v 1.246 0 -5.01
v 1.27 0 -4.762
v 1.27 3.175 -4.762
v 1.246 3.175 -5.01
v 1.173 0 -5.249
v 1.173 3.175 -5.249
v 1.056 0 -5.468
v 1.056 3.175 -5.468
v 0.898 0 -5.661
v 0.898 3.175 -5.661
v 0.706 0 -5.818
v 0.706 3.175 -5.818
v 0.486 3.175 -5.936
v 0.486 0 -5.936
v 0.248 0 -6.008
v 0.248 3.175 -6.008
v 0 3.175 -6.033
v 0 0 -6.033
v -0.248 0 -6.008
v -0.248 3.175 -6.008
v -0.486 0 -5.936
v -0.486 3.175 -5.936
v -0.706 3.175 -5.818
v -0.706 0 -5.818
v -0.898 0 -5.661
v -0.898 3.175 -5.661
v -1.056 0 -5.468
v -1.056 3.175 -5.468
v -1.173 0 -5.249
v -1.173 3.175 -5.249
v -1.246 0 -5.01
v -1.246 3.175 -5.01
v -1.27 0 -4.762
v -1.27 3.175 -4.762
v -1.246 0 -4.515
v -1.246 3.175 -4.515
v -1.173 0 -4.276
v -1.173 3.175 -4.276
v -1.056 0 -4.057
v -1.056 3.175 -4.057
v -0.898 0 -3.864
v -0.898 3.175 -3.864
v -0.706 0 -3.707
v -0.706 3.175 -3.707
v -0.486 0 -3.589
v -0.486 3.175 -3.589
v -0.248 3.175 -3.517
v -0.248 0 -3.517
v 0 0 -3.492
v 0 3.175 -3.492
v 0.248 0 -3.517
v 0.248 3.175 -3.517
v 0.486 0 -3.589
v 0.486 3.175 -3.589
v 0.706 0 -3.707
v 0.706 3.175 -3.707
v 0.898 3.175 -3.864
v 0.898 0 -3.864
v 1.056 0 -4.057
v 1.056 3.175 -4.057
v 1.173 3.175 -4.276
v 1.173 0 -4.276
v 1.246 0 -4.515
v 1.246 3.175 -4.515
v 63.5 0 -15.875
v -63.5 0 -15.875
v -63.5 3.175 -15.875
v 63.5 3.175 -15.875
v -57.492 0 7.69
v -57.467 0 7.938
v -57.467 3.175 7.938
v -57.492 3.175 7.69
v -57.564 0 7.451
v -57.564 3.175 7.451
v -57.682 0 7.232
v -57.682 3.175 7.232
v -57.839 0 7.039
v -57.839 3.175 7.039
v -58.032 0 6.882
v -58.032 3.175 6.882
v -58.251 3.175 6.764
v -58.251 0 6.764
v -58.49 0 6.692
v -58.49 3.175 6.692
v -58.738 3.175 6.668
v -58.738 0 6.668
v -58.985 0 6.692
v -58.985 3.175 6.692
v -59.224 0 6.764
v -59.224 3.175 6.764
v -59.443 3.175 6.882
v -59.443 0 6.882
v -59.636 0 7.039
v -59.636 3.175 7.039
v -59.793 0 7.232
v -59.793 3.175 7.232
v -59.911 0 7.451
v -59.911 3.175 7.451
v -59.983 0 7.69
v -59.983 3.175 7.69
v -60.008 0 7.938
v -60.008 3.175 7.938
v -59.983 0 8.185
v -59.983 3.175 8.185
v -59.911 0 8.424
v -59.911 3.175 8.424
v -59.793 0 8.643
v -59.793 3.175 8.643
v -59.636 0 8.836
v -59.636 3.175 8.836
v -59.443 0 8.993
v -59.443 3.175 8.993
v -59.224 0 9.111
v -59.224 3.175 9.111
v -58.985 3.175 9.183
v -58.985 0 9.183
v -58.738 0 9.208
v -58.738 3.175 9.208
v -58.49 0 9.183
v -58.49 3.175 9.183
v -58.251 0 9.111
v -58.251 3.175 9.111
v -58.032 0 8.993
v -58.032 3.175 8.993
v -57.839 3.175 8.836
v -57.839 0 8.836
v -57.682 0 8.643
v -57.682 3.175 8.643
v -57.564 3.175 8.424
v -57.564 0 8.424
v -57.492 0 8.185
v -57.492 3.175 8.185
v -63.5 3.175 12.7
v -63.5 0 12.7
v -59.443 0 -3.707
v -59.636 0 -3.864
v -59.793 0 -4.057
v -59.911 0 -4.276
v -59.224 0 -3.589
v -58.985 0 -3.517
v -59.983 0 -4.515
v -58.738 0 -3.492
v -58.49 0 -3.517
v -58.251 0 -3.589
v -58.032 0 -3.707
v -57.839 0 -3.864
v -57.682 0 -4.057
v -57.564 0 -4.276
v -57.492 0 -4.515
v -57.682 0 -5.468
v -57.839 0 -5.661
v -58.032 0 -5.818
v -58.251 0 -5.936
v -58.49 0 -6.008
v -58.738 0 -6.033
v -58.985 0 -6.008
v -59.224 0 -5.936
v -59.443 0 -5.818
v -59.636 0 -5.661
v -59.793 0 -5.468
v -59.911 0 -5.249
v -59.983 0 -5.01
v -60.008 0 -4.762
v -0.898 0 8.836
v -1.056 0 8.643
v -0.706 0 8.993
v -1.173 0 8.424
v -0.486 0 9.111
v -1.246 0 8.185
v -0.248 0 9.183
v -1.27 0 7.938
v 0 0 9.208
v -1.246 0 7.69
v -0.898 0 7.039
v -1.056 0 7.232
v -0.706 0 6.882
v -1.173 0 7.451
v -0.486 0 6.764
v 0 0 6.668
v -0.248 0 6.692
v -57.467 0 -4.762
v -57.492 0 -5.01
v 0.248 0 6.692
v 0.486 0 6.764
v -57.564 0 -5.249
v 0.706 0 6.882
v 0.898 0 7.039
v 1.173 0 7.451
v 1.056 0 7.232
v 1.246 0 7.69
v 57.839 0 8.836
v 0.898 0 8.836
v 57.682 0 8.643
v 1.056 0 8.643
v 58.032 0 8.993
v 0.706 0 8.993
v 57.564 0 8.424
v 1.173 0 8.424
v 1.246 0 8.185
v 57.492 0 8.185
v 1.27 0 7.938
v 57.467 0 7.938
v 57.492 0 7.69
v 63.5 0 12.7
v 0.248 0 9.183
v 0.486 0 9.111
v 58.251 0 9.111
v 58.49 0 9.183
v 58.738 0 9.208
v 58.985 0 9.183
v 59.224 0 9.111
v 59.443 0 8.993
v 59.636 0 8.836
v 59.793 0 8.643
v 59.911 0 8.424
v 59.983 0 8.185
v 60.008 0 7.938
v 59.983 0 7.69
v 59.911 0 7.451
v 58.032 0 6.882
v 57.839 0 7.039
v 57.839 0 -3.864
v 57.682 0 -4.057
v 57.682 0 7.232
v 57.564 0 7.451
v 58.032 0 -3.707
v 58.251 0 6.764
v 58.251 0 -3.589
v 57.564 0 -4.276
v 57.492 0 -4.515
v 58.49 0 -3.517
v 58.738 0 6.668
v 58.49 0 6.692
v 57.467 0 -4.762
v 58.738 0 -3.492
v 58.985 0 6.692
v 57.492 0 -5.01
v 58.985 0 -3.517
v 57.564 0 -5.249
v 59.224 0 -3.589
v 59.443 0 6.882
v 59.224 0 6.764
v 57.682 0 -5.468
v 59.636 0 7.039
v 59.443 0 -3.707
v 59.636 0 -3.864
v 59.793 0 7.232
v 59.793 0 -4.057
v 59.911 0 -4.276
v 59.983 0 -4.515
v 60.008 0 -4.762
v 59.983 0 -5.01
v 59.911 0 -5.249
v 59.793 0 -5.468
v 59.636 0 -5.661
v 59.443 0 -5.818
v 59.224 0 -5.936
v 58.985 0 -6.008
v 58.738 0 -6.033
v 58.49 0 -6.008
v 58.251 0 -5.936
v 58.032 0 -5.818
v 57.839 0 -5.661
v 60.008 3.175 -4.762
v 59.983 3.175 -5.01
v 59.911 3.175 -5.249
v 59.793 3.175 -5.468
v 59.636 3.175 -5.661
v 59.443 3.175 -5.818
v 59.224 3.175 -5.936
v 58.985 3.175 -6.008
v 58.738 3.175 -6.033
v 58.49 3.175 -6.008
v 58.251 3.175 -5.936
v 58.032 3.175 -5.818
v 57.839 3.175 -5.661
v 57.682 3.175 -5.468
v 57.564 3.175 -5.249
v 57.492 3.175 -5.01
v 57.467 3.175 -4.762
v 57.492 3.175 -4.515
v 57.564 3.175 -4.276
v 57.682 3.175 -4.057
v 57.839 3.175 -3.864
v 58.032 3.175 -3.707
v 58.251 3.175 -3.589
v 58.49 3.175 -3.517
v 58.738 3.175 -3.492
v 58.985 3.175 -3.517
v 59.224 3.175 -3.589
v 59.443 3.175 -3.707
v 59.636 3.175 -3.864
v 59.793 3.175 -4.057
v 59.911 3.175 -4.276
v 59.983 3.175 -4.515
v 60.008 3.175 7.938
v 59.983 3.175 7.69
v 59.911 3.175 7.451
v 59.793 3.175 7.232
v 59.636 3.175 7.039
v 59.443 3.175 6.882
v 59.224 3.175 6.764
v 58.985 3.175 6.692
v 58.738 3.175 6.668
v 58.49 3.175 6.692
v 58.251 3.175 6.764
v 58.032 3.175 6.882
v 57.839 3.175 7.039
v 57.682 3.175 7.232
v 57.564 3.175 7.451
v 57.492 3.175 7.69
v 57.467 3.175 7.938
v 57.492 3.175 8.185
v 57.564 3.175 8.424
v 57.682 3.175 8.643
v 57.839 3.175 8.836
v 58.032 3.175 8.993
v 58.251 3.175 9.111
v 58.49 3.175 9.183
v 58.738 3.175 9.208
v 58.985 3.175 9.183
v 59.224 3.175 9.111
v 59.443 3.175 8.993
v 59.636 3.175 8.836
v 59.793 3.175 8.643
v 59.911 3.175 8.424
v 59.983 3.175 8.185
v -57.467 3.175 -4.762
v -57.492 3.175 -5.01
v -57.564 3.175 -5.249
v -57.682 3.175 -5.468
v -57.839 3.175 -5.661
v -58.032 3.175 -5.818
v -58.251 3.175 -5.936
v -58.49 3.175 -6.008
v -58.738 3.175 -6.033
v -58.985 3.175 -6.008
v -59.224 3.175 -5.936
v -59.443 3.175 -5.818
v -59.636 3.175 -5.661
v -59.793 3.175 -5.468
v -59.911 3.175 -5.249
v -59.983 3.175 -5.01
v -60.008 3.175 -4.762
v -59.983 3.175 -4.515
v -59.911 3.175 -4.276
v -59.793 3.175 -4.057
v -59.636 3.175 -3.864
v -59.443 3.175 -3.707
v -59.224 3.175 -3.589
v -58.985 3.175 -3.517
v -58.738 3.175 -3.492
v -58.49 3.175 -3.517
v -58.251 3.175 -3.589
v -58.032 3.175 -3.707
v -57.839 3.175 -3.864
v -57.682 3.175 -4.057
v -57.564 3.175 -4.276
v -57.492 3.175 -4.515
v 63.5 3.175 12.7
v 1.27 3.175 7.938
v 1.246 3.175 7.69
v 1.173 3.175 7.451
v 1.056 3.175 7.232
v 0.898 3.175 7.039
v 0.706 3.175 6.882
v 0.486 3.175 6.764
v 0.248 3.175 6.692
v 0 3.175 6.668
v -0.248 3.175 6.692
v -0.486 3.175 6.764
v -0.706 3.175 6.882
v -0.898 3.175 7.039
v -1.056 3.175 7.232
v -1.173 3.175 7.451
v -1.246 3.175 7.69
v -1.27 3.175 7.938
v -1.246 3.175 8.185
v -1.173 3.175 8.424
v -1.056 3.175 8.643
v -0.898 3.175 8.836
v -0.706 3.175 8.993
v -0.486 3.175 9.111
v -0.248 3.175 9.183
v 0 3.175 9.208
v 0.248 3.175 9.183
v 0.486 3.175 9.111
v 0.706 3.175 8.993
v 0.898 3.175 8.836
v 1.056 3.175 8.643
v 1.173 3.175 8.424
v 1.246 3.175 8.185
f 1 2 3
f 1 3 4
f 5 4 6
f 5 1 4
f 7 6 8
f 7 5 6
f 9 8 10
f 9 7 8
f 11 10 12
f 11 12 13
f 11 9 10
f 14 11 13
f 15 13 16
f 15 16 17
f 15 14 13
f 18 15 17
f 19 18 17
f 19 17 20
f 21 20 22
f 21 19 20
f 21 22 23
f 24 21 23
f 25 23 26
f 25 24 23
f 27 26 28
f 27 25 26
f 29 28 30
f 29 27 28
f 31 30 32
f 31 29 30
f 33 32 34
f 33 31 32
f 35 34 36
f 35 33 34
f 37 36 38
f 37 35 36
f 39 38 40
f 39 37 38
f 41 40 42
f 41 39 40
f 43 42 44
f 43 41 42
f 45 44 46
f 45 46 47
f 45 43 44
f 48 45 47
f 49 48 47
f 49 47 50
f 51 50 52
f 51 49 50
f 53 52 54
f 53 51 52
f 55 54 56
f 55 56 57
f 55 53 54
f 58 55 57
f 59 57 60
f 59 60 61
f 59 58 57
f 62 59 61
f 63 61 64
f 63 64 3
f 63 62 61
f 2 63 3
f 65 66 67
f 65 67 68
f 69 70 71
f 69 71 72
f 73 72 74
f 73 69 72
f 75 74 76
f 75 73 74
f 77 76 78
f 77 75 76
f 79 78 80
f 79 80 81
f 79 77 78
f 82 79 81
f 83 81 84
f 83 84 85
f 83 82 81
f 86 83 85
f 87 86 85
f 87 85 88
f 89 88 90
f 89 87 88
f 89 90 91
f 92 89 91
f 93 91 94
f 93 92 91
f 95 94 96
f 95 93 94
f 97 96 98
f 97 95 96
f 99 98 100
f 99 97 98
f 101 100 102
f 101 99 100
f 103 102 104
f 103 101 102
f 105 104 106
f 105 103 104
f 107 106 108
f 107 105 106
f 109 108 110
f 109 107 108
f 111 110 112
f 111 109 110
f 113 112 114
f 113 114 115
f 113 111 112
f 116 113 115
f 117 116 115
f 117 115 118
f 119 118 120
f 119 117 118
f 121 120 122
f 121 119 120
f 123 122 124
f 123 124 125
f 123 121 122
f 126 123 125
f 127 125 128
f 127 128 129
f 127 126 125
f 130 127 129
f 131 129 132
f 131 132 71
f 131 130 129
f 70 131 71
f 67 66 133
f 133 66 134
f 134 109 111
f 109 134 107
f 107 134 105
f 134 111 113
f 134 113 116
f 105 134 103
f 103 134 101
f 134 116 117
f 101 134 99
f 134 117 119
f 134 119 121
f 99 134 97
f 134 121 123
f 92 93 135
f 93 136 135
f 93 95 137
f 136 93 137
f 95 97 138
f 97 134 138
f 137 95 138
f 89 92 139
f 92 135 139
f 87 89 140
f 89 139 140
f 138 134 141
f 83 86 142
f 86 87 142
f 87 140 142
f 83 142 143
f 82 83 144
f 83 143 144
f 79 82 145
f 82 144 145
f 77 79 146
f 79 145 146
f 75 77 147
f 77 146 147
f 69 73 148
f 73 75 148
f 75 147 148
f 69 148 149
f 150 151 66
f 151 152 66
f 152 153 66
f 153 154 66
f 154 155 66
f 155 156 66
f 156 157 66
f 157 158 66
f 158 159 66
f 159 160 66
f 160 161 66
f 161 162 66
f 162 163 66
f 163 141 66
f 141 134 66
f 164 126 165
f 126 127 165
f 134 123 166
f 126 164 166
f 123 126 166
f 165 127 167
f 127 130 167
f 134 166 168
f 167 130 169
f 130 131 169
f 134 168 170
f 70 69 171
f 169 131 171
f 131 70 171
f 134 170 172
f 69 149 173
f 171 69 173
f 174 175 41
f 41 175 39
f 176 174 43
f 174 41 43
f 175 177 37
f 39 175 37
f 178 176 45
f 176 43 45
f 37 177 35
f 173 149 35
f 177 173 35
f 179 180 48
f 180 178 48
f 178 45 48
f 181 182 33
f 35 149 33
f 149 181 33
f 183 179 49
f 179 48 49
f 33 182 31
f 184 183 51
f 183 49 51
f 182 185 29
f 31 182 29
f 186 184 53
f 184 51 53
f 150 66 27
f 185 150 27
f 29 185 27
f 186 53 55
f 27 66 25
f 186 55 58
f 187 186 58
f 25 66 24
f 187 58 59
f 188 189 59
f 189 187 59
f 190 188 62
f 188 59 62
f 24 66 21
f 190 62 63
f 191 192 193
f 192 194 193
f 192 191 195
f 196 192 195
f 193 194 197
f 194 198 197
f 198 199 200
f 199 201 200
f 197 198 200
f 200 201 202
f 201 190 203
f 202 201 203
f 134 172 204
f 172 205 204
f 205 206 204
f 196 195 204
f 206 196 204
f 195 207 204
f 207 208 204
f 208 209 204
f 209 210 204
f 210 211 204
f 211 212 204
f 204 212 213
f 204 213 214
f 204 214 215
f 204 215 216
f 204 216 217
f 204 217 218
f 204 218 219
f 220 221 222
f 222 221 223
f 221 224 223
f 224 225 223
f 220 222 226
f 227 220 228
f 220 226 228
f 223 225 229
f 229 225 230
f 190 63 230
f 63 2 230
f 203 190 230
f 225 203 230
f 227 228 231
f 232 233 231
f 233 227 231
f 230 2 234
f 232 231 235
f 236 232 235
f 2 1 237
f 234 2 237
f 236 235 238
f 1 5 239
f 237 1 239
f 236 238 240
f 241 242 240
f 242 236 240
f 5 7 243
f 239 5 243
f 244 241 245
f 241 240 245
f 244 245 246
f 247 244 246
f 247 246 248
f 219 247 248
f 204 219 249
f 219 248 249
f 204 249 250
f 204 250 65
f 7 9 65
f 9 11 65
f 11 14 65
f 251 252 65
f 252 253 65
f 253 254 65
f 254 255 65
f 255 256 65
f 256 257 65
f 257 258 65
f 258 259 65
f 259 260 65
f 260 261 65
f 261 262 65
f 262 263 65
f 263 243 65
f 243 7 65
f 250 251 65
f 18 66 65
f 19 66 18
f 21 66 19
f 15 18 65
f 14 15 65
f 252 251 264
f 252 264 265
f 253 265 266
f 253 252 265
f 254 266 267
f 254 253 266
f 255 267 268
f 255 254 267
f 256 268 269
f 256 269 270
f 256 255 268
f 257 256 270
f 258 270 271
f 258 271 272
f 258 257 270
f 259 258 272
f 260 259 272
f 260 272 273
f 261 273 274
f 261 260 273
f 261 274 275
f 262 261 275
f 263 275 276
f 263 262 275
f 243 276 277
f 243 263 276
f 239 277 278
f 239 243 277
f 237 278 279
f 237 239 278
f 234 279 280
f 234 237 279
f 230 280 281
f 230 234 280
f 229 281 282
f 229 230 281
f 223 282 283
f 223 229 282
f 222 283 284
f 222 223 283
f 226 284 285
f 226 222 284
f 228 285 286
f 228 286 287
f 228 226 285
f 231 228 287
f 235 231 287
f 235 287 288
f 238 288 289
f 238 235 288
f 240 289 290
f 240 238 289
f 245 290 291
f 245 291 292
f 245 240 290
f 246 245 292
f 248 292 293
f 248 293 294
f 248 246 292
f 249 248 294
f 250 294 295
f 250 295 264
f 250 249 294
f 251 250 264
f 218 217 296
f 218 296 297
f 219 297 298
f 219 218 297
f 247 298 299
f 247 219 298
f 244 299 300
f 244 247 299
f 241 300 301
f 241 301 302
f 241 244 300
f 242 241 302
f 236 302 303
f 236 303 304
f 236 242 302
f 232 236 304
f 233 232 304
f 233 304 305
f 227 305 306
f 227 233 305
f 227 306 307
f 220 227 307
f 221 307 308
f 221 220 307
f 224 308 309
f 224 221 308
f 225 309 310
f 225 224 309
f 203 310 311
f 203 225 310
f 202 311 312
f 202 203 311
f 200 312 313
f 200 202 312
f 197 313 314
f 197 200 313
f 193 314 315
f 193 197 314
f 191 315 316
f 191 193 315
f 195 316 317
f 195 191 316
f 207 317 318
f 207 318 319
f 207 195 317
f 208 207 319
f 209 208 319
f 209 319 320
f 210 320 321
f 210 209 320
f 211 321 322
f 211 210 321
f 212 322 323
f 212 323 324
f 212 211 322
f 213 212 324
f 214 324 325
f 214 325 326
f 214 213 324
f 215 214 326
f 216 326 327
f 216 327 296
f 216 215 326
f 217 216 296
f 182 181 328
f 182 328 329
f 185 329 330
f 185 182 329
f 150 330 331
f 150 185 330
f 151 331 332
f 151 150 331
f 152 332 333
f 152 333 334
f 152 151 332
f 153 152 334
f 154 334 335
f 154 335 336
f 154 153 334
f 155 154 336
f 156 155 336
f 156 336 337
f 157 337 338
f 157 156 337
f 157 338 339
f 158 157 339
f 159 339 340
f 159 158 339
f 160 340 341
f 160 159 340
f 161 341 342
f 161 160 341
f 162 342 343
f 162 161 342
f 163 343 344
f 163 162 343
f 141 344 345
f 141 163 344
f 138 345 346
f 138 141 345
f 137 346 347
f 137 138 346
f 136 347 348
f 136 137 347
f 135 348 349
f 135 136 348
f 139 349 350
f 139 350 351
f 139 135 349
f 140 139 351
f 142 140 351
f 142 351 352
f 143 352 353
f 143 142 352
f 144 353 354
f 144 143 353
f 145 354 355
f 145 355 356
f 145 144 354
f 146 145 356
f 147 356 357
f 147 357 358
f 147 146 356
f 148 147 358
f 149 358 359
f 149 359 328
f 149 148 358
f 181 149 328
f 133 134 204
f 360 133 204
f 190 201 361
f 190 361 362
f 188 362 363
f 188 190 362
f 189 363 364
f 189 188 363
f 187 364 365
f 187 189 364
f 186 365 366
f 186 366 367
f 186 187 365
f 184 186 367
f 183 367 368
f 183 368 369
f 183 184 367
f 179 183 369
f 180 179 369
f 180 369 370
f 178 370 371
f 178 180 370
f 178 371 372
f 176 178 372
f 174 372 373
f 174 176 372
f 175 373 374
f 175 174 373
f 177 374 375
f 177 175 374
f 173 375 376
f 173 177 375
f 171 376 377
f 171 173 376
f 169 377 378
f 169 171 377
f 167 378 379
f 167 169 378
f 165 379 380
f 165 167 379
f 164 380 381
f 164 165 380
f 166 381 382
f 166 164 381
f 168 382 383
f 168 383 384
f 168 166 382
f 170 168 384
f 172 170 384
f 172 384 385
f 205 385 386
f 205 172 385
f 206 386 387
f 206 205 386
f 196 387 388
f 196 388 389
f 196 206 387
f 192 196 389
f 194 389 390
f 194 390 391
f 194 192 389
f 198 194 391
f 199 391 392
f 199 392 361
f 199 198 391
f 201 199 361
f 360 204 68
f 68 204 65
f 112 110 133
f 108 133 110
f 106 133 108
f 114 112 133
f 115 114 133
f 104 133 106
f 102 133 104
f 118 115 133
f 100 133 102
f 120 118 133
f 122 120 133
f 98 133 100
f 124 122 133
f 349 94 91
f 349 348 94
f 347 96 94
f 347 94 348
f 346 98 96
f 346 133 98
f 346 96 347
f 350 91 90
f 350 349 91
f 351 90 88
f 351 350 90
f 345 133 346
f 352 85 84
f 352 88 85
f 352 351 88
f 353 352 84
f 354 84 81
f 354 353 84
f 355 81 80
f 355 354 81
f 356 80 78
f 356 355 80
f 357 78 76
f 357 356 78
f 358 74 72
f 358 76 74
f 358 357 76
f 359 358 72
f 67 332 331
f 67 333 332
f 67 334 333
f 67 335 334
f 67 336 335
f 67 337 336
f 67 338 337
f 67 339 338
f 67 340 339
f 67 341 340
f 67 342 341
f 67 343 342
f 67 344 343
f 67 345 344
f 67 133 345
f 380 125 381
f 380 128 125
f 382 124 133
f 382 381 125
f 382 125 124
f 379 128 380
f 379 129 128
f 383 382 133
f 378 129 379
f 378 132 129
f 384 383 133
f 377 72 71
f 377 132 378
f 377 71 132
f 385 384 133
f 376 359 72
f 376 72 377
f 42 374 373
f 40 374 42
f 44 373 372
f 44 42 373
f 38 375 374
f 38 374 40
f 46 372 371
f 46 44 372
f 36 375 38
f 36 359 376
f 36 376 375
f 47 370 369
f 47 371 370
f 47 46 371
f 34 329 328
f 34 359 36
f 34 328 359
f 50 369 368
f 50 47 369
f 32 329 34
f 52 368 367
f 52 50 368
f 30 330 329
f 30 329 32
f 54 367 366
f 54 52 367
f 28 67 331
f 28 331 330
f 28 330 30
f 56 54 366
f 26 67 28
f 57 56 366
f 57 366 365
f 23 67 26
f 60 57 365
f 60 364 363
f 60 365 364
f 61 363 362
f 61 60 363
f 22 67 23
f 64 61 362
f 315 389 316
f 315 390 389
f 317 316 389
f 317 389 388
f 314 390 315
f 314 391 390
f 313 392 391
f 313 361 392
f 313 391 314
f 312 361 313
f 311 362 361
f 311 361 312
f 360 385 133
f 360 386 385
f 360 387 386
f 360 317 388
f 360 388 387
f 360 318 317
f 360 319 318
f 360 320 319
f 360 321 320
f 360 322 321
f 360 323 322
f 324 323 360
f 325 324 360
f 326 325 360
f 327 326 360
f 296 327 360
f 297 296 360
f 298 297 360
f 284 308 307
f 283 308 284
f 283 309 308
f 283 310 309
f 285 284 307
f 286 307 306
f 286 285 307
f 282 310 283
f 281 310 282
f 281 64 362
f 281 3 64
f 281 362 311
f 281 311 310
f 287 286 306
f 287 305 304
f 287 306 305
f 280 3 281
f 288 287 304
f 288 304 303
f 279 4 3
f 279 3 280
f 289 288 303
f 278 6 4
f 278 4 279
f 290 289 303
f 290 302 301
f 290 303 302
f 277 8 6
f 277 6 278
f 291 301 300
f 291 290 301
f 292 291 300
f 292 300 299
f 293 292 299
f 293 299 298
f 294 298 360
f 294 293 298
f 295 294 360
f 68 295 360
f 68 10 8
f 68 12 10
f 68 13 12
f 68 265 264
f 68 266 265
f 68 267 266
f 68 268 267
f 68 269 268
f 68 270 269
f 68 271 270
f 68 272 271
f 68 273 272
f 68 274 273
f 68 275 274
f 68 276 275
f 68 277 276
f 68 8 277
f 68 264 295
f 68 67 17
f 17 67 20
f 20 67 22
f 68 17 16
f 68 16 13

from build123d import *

# Parameters (mm, degrees)
SKETCH1_W           = 127
SKETCH1_H           = 25.4
SKETCH1_R           = 1.27
SKETCH1_H_2         = 3.175
BOSS_EXTRUDE1_DEPTH = 3.175


with BuildPart() as part:
    # Sketch1 → Boss-Extrude1 (new body)
    with BuildSketch(Plane(origin=(0, 0, 0), x_dir=(1, 0, 0), z_dir=(0, 1, 0))):
        Rectangle(SKETCH1_W, SKETCH1_H)
        with Locations((58.7375, -7.9375)):
            Circle(SKETCH1_R, mode=Mode.SUBTRACT)
        with Locations((0, -7.9375)):
            Circle(SKETCH1_R, mode=Mode.SUBTRACT)
        with Locations((-58.7375, -7.9375)):
            Circle(SKETCH1_R, mode=Mode.SUBTRACT)
        with Locations((58.7375, 4.7625)):
            Circle(SKETCH1_R, mode=Mode.SUBTRACT)
        with Locations((0, 4.7625)):
            Circle(SKETCH1_R, mode=Mode.SUBTRACT)
        with Locations((-58.7375, 4.7625)):
            Circle(SKETCH1_R, mode=Mode.SUBTRACT)
        with Locations((0, 14.2875)):
            Rectangle(SKETCH1_W, SKETCH1_H_2)
    extrude(amount=BOSS_EXTRUDE1_DEPTH)


solid = part.part
